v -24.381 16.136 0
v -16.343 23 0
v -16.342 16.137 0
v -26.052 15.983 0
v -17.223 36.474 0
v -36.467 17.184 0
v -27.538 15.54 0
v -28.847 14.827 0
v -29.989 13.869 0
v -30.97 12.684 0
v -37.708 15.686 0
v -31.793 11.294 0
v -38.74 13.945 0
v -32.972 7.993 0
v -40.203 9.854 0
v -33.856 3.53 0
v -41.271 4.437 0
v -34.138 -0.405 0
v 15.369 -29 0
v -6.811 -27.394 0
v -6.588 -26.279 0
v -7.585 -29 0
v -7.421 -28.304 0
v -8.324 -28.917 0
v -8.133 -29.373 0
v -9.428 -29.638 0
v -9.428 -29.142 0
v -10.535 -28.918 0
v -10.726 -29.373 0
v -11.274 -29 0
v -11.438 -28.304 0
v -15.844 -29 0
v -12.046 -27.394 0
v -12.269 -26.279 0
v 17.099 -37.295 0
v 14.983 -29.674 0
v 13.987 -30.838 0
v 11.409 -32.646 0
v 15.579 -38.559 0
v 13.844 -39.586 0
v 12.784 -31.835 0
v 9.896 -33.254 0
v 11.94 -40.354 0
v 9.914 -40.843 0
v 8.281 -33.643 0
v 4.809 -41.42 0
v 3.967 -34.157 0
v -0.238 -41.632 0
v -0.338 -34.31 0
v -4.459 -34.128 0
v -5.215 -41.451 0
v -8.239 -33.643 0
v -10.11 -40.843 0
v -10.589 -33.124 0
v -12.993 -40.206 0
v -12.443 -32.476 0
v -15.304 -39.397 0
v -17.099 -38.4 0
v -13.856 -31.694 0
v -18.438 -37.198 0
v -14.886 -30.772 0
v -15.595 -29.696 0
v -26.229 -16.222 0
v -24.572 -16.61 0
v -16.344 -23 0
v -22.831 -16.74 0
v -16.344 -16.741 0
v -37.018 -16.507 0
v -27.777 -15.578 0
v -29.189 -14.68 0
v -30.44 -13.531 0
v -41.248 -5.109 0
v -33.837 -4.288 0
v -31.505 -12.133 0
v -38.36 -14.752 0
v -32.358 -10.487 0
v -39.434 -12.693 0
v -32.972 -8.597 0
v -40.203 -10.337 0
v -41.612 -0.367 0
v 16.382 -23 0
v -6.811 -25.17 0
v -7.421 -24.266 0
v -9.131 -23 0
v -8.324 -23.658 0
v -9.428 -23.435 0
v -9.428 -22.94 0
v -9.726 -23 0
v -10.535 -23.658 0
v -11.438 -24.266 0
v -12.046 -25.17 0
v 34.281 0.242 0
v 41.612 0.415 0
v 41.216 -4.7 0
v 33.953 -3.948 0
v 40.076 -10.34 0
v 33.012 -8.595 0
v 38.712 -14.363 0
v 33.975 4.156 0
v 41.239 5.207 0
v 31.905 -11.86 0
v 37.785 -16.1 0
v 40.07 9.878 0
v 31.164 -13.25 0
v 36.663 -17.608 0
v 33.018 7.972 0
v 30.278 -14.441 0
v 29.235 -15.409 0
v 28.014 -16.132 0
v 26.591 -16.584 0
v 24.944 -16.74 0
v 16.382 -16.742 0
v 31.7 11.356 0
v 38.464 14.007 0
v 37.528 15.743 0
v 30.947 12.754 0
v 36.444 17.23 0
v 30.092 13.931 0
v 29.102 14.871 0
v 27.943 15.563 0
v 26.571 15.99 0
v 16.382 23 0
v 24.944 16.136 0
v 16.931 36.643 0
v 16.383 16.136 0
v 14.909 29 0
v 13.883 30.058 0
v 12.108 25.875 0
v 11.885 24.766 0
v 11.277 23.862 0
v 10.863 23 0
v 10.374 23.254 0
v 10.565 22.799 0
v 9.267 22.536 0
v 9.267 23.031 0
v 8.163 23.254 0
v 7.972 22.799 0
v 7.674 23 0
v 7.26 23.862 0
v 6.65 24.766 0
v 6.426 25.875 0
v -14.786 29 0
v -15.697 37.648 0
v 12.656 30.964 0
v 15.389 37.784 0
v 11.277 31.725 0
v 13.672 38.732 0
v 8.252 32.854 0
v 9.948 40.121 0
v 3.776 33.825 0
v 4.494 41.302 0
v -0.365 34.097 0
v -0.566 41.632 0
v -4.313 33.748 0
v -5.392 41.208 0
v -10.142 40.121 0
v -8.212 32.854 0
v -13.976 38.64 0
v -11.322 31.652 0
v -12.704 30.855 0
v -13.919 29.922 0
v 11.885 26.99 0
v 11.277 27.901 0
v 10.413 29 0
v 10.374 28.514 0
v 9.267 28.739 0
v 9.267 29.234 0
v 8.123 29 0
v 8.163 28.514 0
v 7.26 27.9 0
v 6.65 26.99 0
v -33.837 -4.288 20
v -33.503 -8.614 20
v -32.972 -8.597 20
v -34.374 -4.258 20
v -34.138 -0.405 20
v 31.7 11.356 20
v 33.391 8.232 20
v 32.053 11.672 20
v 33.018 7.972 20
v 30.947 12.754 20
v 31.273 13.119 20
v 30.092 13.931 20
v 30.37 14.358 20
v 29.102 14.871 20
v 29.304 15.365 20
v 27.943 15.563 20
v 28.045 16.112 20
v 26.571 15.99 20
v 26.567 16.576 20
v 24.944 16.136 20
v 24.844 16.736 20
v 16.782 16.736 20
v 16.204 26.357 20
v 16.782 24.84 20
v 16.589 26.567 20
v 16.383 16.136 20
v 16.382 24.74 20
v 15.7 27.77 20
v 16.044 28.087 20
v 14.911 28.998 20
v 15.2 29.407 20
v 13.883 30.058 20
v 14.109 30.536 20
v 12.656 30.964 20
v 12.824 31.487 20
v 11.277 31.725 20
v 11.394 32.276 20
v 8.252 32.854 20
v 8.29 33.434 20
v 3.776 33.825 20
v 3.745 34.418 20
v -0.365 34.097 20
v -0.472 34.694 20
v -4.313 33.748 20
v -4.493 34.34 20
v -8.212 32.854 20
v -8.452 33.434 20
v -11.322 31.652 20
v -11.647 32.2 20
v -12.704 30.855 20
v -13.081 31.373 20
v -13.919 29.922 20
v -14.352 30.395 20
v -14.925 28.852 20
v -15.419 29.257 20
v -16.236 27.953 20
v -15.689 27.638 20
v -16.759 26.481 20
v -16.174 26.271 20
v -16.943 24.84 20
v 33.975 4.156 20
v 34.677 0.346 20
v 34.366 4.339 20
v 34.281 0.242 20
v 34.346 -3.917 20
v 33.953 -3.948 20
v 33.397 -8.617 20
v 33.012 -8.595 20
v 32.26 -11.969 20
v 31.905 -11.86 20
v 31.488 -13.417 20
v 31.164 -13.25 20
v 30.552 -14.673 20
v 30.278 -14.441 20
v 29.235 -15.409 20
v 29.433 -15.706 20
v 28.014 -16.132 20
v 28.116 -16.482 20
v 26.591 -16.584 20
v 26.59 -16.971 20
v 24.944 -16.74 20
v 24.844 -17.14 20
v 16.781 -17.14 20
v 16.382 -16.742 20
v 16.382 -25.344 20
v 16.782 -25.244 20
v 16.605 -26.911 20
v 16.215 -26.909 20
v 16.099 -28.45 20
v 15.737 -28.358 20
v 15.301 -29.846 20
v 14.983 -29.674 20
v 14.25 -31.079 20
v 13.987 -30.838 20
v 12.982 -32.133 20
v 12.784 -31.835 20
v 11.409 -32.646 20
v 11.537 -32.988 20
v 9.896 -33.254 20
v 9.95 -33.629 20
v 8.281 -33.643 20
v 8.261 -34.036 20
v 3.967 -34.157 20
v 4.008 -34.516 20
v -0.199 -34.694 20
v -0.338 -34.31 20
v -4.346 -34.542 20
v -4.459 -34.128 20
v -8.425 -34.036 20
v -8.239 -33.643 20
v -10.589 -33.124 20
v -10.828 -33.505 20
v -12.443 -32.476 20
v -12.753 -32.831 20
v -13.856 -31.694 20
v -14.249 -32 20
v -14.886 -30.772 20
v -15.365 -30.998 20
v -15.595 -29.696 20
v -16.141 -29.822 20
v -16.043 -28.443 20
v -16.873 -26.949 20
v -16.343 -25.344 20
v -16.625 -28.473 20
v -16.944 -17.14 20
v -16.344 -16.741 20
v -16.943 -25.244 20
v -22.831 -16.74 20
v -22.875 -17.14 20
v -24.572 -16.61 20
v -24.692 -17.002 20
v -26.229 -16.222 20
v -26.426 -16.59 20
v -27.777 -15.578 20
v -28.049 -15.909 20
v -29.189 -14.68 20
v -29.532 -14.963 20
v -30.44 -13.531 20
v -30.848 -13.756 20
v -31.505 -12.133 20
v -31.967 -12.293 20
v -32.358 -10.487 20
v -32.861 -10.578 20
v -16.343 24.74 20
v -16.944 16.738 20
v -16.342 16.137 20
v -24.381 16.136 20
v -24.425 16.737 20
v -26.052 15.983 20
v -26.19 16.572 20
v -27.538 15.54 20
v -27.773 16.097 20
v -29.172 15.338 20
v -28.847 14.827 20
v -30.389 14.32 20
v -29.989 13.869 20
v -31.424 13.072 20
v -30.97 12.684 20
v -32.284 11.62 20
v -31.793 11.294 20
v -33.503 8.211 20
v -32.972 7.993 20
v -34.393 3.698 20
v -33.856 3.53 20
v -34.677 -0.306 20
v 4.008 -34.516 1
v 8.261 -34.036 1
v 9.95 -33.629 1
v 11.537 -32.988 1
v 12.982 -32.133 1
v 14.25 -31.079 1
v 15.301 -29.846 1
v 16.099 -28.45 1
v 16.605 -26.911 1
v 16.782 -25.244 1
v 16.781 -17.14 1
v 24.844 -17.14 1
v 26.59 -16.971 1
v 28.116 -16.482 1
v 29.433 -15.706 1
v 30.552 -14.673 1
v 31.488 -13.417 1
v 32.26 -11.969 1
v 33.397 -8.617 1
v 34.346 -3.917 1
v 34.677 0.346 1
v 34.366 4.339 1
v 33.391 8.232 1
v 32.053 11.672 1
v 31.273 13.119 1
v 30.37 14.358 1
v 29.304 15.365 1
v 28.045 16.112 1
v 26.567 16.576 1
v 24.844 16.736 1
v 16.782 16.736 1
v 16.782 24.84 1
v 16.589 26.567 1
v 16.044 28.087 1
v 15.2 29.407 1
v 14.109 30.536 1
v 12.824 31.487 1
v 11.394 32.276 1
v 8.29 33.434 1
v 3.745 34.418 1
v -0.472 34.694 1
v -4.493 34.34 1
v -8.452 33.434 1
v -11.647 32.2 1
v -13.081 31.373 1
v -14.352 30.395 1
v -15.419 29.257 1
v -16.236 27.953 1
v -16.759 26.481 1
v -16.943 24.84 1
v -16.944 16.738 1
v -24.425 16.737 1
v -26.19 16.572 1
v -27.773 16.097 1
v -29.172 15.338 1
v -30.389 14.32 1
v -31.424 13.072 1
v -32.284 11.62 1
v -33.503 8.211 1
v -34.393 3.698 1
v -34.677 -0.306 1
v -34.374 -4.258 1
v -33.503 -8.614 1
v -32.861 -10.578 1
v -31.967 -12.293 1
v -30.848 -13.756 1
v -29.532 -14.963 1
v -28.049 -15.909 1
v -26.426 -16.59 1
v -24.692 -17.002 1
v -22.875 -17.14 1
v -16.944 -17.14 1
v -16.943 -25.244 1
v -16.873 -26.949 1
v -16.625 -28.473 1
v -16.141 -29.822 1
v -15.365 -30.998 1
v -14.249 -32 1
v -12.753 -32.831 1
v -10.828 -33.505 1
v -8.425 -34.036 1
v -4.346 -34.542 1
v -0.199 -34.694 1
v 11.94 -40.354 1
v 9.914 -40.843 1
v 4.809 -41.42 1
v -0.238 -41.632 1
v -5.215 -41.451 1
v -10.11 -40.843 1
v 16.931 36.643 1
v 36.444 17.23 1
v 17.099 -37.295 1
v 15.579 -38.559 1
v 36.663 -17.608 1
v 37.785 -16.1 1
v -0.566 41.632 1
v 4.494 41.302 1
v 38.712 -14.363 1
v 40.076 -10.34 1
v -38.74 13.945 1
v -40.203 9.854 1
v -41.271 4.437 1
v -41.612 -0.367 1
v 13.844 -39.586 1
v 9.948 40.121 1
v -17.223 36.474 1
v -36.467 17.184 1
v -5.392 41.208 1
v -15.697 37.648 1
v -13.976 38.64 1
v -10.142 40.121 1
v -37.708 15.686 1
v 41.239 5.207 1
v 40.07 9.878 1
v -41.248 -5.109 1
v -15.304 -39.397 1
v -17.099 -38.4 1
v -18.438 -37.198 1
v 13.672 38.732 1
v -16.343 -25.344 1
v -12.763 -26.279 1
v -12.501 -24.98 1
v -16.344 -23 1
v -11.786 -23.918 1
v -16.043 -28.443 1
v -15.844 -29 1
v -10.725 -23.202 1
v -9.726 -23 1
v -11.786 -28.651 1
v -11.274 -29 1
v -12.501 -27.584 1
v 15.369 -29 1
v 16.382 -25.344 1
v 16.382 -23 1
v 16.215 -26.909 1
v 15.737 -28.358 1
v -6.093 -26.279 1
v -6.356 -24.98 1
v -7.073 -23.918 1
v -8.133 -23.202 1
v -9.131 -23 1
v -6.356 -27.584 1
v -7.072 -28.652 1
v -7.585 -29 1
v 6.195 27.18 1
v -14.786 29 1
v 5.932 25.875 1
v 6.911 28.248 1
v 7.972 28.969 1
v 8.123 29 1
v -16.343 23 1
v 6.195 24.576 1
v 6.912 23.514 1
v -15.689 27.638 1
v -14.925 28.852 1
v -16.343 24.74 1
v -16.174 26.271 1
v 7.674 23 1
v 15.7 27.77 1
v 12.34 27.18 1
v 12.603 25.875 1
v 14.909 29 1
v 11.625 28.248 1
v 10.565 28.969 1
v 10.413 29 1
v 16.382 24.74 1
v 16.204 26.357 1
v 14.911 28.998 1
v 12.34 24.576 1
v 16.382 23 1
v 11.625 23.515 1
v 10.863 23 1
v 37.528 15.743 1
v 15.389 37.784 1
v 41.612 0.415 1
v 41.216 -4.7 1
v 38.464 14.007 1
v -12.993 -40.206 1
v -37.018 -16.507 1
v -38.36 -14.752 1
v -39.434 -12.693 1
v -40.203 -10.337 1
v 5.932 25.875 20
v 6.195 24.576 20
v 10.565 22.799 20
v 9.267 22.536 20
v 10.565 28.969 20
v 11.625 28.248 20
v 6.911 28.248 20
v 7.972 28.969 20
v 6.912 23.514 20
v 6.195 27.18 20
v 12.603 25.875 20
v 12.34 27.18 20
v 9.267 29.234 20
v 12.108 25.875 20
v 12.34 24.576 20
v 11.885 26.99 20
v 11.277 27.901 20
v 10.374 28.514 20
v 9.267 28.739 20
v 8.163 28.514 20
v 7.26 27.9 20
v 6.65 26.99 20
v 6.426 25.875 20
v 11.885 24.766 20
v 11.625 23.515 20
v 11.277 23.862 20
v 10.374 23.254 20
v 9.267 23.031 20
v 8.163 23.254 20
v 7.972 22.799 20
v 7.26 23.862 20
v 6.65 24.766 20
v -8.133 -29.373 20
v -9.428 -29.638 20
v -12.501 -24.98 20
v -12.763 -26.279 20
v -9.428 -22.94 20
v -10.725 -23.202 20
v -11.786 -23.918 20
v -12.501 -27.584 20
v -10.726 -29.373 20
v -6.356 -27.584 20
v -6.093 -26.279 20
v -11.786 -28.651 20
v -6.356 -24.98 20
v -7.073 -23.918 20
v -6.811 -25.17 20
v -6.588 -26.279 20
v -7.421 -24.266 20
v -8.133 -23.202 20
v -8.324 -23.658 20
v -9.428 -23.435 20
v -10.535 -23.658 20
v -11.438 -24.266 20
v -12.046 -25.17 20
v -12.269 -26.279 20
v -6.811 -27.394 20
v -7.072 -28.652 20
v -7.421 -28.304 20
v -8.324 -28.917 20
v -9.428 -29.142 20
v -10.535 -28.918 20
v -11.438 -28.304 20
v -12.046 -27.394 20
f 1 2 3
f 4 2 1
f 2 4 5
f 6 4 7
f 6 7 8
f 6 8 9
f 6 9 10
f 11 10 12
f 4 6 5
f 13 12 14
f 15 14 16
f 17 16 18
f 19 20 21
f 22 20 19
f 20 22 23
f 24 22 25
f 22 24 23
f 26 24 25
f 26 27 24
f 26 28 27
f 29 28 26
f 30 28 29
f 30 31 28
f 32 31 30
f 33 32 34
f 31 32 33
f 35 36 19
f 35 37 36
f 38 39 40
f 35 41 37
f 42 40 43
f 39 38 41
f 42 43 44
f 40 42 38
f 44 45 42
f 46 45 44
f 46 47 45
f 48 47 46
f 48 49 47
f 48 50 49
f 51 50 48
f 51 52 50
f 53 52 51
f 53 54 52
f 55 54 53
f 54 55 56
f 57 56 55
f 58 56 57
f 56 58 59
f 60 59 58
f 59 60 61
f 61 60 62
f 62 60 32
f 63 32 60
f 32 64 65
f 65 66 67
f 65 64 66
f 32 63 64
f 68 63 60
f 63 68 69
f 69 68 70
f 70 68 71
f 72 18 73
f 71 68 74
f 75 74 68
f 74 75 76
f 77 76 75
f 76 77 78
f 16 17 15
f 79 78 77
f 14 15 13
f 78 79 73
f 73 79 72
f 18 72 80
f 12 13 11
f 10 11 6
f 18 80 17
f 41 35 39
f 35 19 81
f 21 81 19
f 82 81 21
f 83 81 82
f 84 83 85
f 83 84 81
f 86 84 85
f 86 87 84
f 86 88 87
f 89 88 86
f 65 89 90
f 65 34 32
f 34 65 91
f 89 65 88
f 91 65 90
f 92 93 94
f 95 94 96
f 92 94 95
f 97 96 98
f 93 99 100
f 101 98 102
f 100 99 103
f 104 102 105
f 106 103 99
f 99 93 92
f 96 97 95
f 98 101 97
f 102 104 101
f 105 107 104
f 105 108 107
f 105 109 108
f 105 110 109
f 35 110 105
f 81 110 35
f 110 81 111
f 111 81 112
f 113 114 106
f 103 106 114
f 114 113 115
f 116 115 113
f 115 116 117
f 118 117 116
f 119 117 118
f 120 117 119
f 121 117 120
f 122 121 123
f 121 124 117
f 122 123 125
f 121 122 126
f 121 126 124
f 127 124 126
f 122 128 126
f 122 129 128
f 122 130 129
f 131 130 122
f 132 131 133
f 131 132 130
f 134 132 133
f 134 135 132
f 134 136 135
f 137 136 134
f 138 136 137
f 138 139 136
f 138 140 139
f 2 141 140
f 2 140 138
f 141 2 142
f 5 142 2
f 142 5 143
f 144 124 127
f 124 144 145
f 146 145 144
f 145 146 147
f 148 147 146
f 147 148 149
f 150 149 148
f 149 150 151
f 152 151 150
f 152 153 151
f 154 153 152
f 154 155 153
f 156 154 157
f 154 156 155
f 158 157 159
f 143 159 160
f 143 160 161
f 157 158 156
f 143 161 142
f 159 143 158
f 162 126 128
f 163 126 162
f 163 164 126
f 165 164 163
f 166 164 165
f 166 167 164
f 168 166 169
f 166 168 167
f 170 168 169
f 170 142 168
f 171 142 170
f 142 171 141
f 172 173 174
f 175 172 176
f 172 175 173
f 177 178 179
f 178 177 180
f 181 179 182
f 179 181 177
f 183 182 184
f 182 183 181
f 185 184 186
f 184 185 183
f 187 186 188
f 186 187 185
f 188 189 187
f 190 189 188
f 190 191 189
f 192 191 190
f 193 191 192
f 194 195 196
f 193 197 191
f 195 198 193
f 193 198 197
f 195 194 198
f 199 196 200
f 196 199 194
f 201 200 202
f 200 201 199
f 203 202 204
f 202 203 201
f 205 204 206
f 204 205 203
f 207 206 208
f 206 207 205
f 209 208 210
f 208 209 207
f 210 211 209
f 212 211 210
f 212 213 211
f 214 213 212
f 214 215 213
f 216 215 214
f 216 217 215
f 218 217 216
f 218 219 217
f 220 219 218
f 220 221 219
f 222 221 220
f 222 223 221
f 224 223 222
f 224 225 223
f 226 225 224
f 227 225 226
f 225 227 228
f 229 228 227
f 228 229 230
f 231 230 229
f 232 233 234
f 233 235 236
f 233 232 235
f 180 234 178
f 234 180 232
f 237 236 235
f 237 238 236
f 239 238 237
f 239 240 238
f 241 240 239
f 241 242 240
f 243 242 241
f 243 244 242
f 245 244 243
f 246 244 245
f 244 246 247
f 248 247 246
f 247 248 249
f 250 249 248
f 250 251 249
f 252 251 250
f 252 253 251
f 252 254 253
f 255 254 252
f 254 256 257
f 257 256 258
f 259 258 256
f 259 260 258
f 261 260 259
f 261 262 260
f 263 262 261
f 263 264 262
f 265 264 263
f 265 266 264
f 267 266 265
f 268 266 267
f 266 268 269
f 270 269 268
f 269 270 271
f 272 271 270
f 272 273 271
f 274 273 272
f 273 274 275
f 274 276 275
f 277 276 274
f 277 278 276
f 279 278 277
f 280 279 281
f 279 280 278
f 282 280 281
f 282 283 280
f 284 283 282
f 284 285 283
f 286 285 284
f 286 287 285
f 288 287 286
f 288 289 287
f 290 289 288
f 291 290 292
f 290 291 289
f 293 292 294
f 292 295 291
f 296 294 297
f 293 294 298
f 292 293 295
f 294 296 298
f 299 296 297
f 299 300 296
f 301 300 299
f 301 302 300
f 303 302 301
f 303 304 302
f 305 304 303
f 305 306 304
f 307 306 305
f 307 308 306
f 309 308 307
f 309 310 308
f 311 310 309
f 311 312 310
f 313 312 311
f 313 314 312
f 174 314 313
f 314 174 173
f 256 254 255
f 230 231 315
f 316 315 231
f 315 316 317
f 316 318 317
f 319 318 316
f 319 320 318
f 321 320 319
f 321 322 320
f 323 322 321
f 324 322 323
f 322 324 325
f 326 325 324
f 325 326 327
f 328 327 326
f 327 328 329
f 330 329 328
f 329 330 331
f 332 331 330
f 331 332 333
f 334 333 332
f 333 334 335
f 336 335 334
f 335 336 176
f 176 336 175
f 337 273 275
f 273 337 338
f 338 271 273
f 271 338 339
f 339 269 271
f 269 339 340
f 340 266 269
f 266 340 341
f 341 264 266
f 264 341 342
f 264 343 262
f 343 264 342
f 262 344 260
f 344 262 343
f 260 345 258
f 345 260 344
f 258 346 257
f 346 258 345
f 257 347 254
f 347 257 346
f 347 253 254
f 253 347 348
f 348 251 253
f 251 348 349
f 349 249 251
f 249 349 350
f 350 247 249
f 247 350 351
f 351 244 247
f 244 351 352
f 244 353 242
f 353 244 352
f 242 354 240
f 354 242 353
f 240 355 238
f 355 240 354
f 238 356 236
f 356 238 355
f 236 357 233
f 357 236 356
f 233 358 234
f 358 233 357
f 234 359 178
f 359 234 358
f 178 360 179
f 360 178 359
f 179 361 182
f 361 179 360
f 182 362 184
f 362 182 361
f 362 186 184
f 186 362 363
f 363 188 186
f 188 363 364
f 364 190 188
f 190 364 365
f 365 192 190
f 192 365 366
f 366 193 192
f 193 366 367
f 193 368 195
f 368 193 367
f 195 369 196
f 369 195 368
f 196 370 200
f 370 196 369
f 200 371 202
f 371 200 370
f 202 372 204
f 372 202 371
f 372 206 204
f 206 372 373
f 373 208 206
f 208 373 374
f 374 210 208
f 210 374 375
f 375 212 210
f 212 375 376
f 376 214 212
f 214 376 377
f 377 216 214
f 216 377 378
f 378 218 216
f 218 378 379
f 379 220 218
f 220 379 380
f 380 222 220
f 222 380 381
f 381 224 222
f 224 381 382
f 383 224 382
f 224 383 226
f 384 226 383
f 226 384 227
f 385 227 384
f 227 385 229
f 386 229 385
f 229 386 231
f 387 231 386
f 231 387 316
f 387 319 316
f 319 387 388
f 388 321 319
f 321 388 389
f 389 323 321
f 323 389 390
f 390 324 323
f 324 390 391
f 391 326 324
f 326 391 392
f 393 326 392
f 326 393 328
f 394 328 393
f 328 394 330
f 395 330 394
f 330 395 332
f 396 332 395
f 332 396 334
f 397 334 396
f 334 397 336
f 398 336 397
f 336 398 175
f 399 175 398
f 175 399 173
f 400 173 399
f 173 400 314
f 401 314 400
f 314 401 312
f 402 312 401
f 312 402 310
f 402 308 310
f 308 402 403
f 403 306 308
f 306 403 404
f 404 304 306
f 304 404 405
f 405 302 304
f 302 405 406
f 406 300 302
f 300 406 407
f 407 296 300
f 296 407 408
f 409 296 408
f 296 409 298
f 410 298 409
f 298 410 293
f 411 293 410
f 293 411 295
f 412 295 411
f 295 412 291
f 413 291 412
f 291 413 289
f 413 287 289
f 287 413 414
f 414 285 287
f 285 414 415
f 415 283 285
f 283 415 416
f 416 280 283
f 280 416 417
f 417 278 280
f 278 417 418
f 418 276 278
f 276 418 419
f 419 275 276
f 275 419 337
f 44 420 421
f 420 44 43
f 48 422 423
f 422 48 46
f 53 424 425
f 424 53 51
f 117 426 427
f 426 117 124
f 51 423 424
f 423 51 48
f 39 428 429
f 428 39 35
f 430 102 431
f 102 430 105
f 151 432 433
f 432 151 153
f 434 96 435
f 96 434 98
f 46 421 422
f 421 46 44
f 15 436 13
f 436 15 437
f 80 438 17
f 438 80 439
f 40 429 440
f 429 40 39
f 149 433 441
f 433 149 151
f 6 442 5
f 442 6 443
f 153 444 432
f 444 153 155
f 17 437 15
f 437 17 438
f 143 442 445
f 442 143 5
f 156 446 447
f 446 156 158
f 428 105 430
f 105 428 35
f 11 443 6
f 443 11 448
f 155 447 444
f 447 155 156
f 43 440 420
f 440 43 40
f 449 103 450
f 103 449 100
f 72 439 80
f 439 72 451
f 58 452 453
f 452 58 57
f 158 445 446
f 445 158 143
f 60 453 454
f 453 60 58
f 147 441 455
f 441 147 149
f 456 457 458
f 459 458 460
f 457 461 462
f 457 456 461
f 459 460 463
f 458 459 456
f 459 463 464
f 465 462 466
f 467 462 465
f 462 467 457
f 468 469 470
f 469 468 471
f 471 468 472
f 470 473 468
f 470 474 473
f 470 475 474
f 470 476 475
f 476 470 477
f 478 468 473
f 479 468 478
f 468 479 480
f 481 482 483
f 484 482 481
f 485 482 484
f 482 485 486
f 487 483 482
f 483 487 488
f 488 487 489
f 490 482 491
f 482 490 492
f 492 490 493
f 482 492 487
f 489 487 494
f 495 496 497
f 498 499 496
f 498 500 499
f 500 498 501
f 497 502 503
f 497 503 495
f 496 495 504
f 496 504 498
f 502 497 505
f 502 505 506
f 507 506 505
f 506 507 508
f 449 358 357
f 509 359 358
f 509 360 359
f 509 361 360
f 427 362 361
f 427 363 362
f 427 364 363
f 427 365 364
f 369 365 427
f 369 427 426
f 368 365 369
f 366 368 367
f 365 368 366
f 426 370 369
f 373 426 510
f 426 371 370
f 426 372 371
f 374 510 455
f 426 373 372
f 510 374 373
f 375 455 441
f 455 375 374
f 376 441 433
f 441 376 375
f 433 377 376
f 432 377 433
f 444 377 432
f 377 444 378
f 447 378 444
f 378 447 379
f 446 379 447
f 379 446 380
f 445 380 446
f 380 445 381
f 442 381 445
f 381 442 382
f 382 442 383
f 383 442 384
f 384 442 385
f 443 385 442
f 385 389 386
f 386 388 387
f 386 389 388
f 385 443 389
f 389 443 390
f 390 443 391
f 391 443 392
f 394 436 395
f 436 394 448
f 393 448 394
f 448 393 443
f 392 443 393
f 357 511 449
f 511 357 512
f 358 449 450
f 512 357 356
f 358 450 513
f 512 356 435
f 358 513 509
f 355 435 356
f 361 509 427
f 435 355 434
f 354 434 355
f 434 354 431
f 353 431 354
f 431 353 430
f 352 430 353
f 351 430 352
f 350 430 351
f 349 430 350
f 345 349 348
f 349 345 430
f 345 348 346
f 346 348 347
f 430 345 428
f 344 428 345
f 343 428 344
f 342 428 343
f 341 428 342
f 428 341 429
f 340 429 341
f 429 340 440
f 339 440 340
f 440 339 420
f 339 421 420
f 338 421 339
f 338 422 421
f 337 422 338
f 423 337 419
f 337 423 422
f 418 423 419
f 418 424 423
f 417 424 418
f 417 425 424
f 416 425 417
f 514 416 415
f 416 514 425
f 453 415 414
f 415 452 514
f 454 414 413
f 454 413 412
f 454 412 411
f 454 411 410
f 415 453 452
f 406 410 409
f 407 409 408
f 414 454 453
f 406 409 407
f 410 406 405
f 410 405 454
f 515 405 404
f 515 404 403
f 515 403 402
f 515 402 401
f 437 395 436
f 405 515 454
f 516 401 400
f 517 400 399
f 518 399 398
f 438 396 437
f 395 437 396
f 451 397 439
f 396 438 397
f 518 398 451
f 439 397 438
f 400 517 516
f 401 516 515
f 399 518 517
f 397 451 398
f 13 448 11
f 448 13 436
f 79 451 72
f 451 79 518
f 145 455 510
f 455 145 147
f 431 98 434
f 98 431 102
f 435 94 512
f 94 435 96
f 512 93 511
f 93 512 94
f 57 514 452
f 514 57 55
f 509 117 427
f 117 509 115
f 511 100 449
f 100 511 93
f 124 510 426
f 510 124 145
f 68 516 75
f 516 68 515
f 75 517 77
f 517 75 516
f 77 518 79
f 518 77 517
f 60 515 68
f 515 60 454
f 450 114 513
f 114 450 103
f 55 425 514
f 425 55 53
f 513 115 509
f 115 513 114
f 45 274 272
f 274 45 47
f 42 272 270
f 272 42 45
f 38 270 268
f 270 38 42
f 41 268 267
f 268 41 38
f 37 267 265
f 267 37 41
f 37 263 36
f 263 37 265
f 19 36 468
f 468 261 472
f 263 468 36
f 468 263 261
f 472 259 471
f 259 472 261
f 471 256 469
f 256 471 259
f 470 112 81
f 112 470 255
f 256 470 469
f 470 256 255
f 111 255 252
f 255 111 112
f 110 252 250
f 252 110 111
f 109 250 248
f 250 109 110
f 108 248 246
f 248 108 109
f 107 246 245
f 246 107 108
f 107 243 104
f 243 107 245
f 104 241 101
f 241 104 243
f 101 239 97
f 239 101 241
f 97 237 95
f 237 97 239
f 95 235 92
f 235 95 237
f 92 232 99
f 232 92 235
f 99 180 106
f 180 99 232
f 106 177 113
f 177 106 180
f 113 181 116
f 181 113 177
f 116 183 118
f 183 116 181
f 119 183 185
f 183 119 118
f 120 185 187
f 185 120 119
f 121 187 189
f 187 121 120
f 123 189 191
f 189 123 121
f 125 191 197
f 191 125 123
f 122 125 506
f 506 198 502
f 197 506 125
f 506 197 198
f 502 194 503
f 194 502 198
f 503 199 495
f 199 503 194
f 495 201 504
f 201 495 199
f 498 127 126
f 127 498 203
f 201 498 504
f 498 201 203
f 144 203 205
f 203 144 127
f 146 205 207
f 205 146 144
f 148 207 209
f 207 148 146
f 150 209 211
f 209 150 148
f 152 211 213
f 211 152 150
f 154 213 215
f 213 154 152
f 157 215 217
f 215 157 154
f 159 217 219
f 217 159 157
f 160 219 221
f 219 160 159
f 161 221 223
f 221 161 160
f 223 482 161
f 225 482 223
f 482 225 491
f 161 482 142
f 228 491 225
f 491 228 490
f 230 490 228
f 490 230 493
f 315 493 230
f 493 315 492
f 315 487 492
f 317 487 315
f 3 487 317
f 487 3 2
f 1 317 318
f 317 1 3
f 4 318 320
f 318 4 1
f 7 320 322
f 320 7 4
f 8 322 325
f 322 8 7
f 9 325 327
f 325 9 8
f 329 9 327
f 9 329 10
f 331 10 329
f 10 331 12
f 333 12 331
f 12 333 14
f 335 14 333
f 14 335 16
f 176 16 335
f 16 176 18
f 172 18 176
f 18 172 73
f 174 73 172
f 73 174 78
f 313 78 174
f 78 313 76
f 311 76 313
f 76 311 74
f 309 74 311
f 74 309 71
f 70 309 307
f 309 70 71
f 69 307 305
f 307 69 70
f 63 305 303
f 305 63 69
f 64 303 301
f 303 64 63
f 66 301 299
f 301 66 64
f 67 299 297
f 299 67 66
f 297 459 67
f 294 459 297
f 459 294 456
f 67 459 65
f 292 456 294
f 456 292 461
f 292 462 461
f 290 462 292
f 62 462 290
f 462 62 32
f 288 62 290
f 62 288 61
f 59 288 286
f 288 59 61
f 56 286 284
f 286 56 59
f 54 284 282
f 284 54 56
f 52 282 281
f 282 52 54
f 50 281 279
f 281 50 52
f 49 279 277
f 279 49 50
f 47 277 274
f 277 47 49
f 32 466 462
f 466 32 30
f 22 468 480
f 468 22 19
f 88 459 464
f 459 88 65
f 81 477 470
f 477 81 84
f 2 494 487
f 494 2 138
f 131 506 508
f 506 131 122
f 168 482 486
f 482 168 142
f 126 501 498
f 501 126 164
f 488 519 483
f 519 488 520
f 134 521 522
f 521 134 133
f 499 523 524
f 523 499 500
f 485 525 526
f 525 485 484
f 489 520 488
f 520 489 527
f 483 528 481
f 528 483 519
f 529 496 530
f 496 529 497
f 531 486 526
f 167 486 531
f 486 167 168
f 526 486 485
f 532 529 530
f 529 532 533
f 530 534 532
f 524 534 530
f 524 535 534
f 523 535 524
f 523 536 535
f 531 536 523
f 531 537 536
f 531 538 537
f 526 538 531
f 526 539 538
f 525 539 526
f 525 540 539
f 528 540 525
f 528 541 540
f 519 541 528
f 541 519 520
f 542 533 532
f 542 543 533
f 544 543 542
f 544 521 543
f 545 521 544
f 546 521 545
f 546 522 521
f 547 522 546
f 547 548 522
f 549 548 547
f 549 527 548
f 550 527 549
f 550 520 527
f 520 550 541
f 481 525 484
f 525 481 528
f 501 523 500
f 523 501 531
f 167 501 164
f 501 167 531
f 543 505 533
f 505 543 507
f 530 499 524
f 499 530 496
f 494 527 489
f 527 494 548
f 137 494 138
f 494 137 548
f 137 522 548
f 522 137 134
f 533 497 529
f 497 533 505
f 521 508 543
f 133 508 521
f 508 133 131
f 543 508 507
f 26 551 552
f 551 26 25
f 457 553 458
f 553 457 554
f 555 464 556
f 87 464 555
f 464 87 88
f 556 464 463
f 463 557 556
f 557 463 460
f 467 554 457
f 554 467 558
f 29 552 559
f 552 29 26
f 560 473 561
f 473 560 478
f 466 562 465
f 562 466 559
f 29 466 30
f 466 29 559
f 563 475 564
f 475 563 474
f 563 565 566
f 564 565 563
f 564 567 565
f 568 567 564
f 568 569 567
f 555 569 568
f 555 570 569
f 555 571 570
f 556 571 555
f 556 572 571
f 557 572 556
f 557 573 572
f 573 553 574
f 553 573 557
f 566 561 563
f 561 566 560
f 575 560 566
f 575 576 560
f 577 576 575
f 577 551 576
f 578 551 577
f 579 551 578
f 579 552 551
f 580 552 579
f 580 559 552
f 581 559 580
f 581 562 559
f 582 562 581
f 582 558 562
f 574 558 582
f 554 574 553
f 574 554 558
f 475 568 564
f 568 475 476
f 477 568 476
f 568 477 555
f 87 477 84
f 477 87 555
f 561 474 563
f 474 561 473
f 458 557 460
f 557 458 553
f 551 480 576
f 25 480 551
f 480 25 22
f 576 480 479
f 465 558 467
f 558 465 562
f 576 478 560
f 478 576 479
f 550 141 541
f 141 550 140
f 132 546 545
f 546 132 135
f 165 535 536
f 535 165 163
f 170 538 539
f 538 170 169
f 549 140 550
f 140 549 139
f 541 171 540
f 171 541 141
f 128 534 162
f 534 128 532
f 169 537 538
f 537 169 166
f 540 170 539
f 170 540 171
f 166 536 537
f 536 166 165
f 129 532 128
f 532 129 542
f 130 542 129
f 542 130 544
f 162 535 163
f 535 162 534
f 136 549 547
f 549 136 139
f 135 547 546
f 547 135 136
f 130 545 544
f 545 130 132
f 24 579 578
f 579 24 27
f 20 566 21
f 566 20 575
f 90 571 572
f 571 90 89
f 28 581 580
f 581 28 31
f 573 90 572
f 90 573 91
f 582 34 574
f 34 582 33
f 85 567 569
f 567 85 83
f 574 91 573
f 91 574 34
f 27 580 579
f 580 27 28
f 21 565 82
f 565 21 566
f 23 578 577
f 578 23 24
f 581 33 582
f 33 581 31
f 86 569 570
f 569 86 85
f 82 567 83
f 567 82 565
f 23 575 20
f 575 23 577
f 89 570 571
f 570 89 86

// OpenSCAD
// file: p-all.scad
// Module names are of the form poly_<inkscape-path-id>().  As a result,
// you can associate a polygon in this OpenSCAD program with the corresponding
// SVG element in the Inkscape document by looking for the XML element with
// the attribute id="inkscape-path-id".

// fudge value is used to ensure that subtracted solids are a tad taller
// in the z dimension than the polygon being subtracted from.  This helps
// keep the resulting .stl file manifold.
fudge = 0.1;

module poly_eyes_outer(h)
{
  scale([25.4/90, -25.4/90, 1]) union()
  {
    linear_extrude(height=h)
      polygon([[32.837080,79.852283],[28.248753,80.782448],[24.490404,83.318709],[21.950510,87.079716],[21.017550,91.684120],[21.949887,96.307622],[24.488742,100.091263],[28.246884,102.646430],[32.837080,103.584510],[37.435383,102.646137],[41.191990,100.090483],[43.725587,96.306745],[44.654860,91.684120],[43.724971,87.080598],[41.190340,83.319492],[37.433524,80.782742],[32.837080,79.852283]]);
    linear_extrude(height=h)
      polygon([[-33.406960,-105.014906],[-38.005265,-104.076535],[-41.761873,-101.520886],[-44.295467,-97.737148],[-45.224730,-93.114516],[-44.294839,-88.510989],[-41.760208,-84.749883],[-38.003394,-82.213133],[-33.406960,-81.282676],[-28.818917,-82.212840],[-25.061171,-84.749099],[-22.521878,-88.510107],[-21.589190,-93.114516],[-22.521255,-97.738022],[-25.059510,-101.521662],[-28.817048,-104.076826],[-33.406960,-105.014906]]);
  }
}

module poly_eyes_inner(h)
{
  scale([25.4/90, -25.4/90, 1]) union()
  {
    linear_extrude(height=h)
      polygon([[32.837080,81.606580],[28.923757,82.396157],[25.723269,84.551912],[23.562939,87.754387],[22.770090,91.684120],[23.563564,95.634372],[25.724937,98.859322],[28.925634,101.033194],[32.837080,101.830213],[36.758079,101.033487],[39.957076,98.860101],[42.112383,95.635249],[42.902310,91.684120],[42.113009,87.753506],[39.958737,84.551129],[36.759945,82.395863],[32.837080,81.606580]]);
    linear_extrude(height=h)
      polygon([[-33.406960,-103.260606],[-37.327960,-102.463882],[-40.526960,-100.290501],[-42.682267,-97.065650],[-43.472190,-93.114516],[-42.682887,-89.183893],[-40.528614,-85.981517],[-37.329821,-83.826255],[-33.406960,-83.036976],[-29.493925,-83.826548],[-26.294040,-85.982297],[-24.134308,-89.184770],[-23.341730,-93.114516],[-24.134931,-97.064776],[-26.295701,-100.289724],[-29.495794,-102.463590],[-33.406960,-103.260606]]);
  }
}

module poly_py_outer(h)
{
  scale([25.4/90, -25.4/90, 1]) union()
  {
    linear_extrude(height=h)
      polygon([[88.029070,59.302144],[94.135396,58.735301],[99.372450,57.088412],[103.832834,54.441942],[107.609150,50.876354],[110.811086,46.486298],[113.574748,41.358773],[118.316180,29.167374],[121.768930,15.374916],[122.870240,1.224962],[121.699395,-13.878591],[118.335680,-30.531846],[114.308554,-42.410872],[111.570559,-47.539127],[108.255610,-51.990826],[104.290881,-55.651510],[99.624385,-58.401669],[94.216859,-60.131954],
      
      [88.029040,-60.733016],[59.461220,-60.733016],
      [59.464220,-89.447406],[58.836541,-95.352555],
      
      [57.042611,-100.808782],[54.216092,-105.753247],[50.490645,-110.123111],[45.999932,-113.855532],[40.877614,-116.887672],[35.257353,-119.156689],[29.272810,-120.599746],[14.199821,-122.302284],[-0.703595,-122.930431],[-15.400071,-122.393235],[-29.852240,-120.599746],[-38.366197,-118.717515],[-45.188106,-116.328878],[-50.489542,-113.384758],[-54.442080,-109.836076],[-57.192198,-105.668070],[-58.906595,-100.889654],[-59.787172,-95.487281],[-60.035830,-89.447406],[-60.036600,-60.732246],[-81.053710,-60.732566],[-87.491355,-60.242922],[-93.635805,-58.783917],[-99.386427,-56.370736],[-104.642587,-53.018561],[-109.303654,-48.742575],[-113.268993,-43.557961],[-116.437973,-37.479904],[-118.709960,-30.523586],[-121.796122,-15.085634],[-122.870240,-1.084613],[-121.864218,13.101707],[-118.709960,29.095554],[-114.390573,41.174978],[-111.343859,46.316592],[-107.676750,50.740094],[-103.366956,54.347307],[-98.407909,57.037989],[-92.800567,58.720349],[-86.545890,59.302594],[-60.037620,59.308594],[-60.035620,88.017484],[-59.382566,93.830715],[-57.529005,99.045089],[-54.633342,103.666071],[-50.853980,107.699124],[-46.349752,111.164080],[-41.268928,114.095557],[-29.947730,118.468654],[-15.920879,121.676301],[-1.670703,122.930431],[13.271038,121.953672],[29.372580,118.468654],[40.371307,114.365304],[45.438972,111.567367],[49.993680,108.199124],[53.859517,104.198499],[56.849873,99.520581],[58.779806,94.136525],[59.464380,88.017484],[59.465380,59.300404]]);
  }
}

module poly_py_inner(h)
{
  scale([25.4/90, -25.4/90, 1]) union()
  {
    linear_extrude(height=h)
      polygon([[57.693180,88.016984],[57.063194,93.745777],[55.275099,98.753028],[52.481686,103.102707],[48.835750,106.858784],[44.488469,110.069034],[39.601826,112.764379],[28.886540,116.765034],[13.026358,120.206010],[-1.646641,121.171084],[-15.637525,119.933633],[-29.451360,116.767034],[-29.453360,116.767034],[-40.470948,112.508032],[-45.370206,109.683523],[-49.672110,106.378364],[-53.239896,102.585928],[-55.946413,98.285177],[-57.663727,93.440687],[-58.263910,88.017034],[-58.258910,57.533364],[-86.744360,57.530364],[-92.665692,56.988551],[-97.930411,55.415932],[-102.569880,52.891739],[-106.615460,49.495204],[-110.090941,45.298024],[-113.005185,40.373984],[-117.185770,28.674894],[-120.317545,12.861613],[-121.316860,-1.080163],[-120.250630,-14.839723],[-117.185770,-30.106356],[-117.185770,-30.108356],[-115.007852,-36.804983],[-111.987025,-42.634909],[-108.214208,-47.590064],[-103.780318,-51.662378],[-98.776270,-54.843781],[-93.292983,-57.126204],[-87.421374,-58.501575],[-81.252360,-58.961826],[-58.267010,-58.964826],[-58.264010,-89.448546],[-57.199435,-100.427192],[-55.613968,-104.867178],[-53.099940,-108.680976],[-49.451894,-111.946216],[-44.444003,-114.717063],[-37.875897,-117.013322],[-29.547210,-118.854796],[-16.155366,-120.570741],[-1.551110,-121.218086],[-1.550930,-121.218086],[13.701945,-120.674027],[28.986170,-118.852846],[34.710494,-117.475955],[40.070399,-115.319799],[44.942959,-112.445633],[49.205249,-108.914711],[52.734344,-104.788286],[55.407320,-100.127614],[57.101250,-94.993949],[57.693210,-89.448546],[57.693210,-58.967266],[88.029140,-58.962266],[93.866470,-58.408166],[98.907156,-56.805631],[103.234422,-54.244303],[106.931490,-50.813826],[110.068443,-46.594116],[112.694279,-41.670363],[116.618990,-30.100936],[119.952386,-13.636407],[121.112030,1.212748],[120.030029,15.080354],[116.638490,28.600234],[116.638490,28.602234],[111.968341,40.592743],[109.302153,45.546876],[106.269350,49.715514],[102.764667,53.047606],[98.656085,55.499258],[93.794076,57.012651],[88.029110,57.529964],[57.695130,57.529744]]);
  }
}
// main file
include <p-all.scad>;    // poly_path4442

scale([1, -1, 1]) union() {
    difference() {
        union() {
            poly_py_outer(20);
            scale([1.2, 1.2, 1]) hull() {
                poly_py_outer(1);
            }
        }
        translate([0.1,0.1,-1]) {
            poly_py_inner(40);
        }
    }
    difference() {
        union() {
            for(r=[0,180]) {
                rotate([0,0,r]) translate([-18,23,0]) {
                    cube([35, 6, 1]);
                }
            }
            poly_eyes_outer(20);
        }
        translate([0,0,-1]) {
            poly_eyes_inner(22);
        }
    }
}
